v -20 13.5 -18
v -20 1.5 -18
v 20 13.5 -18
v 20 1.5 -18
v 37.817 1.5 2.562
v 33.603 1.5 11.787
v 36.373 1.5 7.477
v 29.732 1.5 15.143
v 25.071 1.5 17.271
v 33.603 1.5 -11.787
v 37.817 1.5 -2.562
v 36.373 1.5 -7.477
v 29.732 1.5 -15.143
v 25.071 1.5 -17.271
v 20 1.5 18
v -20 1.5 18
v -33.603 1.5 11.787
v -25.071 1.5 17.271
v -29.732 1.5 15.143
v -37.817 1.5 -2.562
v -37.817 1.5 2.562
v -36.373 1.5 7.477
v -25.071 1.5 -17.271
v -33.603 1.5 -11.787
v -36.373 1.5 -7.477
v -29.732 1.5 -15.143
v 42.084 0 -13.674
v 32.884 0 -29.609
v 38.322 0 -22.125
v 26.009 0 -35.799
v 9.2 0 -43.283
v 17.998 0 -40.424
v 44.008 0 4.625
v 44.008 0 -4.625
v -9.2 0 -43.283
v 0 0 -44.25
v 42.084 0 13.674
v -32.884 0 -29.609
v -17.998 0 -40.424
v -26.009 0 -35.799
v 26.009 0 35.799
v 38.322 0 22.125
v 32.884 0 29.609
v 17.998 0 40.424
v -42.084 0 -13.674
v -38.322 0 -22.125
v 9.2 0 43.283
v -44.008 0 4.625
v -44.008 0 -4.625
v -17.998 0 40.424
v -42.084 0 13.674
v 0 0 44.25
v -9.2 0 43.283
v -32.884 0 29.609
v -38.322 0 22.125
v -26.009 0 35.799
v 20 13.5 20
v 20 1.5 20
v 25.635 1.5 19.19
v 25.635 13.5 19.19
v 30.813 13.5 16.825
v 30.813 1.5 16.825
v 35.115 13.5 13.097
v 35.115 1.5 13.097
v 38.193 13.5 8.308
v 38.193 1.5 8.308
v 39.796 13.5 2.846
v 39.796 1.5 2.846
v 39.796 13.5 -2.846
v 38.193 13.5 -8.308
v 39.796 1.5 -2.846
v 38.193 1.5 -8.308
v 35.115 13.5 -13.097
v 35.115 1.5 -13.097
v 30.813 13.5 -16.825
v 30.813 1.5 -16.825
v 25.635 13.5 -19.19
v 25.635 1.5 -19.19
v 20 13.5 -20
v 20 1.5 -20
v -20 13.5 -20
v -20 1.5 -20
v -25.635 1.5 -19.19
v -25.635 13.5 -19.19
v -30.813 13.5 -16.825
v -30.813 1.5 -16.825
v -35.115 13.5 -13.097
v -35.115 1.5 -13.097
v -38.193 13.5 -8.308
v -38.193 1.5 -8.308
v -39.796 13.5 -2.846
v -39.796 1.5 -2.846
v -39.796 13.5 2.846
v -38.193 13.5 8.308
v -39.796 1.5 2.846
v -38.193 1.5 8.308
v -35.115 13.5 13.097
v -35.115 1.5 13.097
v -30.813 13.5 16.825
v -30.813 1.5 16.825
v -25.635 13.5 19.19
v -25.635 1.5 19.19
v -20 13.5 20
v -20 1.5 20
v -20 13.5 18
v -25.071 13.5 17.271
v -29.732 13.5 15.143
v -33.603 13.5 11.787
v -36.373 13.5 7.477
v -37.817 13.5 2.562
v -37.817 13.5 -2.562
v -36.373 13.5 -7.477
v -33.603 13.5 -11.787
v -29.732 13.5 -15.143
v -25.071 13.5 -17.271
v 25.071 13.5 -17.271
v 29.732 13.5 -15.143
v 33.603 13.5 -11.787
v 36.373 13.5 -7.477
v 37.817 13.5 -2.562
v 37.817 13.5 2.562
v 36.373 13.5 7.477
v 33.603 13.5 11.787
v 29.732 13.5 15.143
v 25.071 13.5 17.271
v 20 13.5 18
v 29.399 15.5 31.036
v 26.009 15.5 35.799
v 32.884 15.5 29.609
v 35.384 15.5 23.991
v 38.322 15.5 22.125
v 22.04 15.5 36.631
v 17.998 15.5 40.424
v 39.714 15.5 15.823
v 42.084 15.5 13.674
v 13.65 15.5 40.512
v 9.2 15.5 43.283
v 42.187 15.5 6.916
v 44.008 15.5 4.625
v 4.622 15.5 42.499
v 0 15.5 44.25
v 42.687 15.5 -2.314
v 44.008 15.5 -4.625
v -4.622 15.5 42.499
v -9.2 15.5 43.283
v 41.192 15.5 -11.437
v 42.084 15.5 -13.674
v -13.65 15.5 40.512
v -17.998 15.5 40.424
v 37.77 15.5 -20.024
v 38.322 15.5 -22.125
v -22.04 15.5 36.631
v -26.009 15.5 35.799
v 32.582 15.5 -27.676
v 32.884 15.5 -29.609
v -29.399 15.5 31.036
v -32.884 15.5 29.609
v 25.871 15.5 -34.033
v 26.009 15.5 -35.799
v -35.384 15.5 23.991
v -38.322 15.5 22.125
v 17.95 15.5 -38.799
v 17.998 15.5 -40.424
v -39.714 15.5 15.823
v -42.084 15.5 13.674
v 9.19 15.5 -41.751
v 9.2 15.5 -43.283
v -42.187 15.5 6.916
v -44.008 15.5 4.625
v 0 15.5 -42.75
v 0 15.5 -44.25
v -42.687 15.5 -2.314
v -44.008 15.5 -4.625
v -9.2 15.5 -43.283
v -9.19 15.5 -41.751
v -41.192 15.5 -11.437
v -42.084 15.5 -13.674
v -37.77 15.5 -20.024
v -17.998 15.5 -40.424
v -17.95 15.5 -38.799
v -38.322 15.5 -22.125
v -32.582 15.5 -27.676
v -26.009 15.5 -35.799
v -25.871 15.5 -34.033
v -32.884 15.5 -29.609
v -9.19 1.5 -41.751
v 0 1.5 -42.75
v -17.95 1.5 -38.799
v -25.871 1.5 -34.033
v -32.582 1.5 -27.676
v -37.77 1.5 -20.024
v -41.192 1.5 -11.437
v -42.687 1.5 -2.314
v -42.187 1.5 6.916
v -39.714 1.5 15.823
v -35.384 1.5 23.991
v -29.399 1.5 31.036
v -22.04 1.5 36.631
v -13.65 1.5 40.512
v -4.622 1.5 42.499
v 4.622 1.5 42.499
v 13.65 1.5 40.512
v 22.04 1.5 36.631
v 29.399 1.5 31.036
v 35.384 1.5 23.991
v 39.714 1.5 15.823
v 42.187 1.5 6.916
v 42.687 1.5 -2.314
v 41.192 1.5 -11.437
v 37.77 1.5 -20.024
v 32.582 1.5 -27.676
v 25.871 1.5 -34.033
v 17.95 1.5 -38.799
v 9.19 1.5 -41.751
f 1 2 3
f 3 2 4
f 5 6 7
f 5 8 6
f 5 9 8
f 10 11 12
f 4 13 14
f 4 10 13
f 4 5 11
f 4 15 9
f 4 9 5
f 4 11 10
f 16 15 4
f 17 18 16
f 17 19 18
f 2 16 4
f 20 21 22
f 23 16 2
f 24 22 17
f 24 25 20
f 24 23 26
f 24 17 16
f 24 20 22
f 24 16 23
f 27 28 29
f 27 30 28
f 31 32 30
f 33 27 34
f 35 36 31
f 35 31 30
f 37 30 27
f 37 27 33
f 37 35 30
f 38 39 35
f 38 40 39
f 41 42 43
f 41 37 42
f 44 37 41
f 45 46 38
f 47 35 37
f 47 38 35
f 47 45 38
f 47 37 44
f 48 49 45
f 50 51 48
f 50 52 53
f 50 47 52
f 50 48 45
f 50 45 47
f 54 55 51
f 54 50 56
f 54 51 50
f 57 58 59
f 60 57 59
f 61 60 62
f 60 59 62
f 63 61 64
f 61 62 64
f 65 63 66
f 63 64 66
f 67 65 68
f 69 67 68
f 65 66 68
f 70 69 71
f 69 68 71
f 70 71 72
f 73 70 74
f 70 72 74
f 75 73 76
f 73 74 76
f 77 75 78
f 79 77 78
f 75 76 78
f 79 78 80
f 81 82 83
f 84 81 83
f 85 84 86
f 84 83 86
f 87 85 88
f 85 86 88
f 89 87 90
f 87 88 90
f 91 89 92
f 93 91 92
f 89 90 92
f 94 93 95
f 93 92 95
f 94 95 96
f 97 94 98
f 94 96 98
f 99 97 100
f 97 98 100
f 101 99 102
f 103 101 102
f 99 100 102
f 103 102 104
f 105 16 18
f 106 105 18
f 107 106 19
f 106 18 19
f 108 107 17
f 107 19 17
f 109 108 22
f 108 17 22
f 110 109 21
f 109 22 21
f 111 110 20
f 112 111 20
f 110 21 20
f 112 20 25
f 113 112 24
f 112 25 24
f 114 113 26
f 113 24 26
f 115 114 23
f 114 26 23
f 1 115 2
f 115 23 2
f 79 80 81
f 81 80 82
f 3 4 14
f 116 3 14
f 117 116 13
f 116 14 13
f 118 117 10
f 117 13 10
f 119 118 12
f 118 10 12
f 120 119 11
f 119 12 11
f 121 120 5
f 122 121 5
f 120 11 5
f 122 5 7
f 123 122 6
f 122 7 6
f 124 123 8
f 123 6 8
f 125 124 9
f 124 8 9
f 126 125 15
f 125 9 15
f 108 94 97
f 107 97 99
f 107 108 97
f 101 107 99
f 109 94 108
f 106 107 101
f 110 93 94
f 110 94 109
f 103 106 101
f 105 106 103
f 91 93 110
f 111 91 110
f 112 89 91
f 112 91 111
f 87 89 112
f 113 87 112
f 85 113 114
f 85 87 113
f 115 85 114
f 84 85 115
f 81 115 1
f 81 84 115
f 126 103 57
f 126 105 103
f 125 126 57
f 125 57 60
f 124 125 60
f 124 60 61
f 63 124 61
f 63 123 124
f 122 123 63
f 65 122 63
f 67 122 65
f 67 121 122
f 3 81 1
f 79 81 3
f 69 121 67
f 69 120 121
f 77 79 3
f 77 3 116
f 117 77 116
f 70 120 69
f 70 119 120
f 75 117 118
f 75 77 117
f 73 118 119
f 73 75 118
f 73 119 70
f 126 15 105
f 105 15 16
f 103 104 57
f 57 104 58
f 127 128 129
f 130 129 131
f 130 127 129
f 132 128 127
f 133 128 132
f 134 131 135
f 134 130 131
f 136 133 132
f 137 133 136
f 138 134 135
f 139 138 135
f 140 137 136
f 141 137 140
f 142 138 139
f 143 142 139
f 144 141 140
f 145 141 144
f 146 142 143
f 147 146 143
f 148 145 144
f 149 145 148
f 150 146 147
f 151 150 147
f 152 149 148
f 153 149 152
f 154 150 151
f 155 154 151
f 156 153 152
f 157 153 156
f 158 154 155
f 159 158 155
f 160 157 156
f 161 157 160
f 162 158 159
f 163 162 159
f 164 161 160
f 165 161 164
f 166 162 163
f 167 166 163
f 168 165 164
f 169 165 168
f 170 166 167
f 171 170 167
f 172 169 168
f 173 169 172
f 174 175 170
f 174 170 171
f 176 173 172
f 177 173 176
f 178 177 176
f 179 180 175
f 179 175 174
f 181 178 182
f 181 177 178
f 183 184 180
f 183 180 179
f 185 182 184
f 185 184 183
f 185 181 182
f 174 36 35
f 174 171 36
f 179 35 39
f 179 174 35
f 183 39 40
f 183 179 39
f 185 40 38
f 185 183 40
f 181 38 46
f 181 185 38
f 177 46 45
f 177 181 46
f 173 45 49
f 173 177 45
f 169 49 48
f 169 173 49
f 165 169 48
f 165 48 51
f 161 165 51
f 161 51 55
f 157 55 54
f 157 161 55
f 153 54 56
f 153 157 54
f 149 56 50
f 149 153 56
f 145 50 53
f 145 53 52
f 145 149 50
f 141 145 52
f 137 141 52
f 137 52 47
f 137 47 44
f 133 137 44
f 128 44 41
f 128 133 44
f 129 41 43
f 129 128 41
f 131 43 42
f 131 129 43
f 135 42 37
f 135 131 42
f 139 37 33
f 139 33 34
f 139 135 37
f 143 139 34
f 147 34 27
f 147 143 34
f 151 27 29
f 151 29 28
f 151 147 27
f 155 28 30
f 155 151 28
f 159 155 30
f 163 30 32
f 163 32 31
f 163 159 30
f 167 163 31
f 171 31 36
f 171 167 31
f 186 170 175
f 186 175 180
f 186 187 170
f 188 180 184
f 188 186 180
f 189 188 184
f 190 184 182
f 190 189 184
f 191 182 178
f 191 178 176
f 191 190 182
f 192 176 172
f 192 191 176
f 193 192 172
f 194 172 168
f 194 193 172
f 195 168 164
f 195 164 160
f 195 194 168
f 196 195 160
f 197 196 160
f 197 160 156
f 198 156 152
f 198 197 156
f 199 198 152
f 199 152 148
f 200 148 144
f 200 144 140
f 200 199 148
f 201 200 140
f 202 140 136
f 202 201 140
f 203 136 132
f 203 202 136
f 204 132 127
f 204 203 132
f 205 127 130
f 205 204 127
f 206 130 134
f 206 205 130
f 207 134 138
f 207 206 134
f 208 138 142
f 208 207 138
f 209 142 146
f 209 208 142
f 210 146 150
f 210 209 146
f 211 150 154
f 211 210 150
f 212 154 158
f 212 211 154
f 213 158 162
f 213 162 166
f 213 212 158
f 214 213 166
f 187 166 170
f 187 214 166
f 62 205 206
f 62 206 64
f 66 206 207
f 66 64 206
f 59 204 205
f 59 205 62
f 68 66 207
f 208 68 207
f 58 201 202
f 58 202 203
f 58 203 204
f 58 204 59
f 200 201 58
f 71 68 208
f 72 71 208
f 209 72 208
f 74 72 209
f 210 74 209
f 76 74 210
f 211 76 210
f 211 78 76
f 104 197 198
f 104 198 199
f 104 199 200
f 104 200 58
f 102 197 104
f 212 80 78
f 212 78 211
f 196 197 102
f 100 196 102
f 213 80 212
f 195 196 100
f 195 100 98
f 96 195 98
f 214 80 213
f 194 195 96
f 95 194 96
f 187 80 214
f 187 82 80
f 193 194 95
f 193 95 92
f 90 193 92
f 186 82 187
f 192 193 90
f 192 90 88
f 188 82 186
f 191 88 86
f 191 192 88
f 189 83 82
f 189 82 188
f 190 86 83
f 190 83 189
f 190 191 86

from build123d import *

# Parameters (mm, degrees)
BOSS_EXTRU_3_DEPTH = 12


with BuildPart() as part:
    # Esquisse1 → Révolution1 (revolve)
    with BuildSketch(Plane.XY, mode=Mode.PRIVATE) as r_volution1_sk:
        Polygon((0, 0), (44.25, 0), (44.25, 15.5), (42.75, 15.5), (42.75, 1.5), (0, 1.5), align=None)
    revolve(r_volution1_sk.sketch.rotate(Axis((0, 0, 0), (0, 1, 0)), 90), axis=Axis((0, 0, 0), (0, 1, 0)))

    # Esquisse4 → Boss.-Extru.3 (add)
    with BuildSketch(Plane(origin=(0, 1.5, 0), x_dir=(1, 0, 0), z_dir=(0, 1, 0))):
        with BuildLine():
            Line((20, 20), (-20, 20))
            ThreePointArc((-20, 20), (-40, 0), (-20, -20))
            Line((-20, -20), (20, -20))
            ThreePointArc((20, -20), (40, 0), (20, 20))
        make_face()
        with BuildLine():
            Line((20, -18), (-20, -18))
            ThreePointArc((-20, -18), (-38, 0), (-20, 18))
            Line((-20, 18), (20, 18))
            ThreePointArc((20, 18), (38, 0), (20, -18))
        make_face(mode=Mode.SUBTRACT)
    extrude(amount=BOSS_EXTRU_3_DEPTH)


solid = part.part
